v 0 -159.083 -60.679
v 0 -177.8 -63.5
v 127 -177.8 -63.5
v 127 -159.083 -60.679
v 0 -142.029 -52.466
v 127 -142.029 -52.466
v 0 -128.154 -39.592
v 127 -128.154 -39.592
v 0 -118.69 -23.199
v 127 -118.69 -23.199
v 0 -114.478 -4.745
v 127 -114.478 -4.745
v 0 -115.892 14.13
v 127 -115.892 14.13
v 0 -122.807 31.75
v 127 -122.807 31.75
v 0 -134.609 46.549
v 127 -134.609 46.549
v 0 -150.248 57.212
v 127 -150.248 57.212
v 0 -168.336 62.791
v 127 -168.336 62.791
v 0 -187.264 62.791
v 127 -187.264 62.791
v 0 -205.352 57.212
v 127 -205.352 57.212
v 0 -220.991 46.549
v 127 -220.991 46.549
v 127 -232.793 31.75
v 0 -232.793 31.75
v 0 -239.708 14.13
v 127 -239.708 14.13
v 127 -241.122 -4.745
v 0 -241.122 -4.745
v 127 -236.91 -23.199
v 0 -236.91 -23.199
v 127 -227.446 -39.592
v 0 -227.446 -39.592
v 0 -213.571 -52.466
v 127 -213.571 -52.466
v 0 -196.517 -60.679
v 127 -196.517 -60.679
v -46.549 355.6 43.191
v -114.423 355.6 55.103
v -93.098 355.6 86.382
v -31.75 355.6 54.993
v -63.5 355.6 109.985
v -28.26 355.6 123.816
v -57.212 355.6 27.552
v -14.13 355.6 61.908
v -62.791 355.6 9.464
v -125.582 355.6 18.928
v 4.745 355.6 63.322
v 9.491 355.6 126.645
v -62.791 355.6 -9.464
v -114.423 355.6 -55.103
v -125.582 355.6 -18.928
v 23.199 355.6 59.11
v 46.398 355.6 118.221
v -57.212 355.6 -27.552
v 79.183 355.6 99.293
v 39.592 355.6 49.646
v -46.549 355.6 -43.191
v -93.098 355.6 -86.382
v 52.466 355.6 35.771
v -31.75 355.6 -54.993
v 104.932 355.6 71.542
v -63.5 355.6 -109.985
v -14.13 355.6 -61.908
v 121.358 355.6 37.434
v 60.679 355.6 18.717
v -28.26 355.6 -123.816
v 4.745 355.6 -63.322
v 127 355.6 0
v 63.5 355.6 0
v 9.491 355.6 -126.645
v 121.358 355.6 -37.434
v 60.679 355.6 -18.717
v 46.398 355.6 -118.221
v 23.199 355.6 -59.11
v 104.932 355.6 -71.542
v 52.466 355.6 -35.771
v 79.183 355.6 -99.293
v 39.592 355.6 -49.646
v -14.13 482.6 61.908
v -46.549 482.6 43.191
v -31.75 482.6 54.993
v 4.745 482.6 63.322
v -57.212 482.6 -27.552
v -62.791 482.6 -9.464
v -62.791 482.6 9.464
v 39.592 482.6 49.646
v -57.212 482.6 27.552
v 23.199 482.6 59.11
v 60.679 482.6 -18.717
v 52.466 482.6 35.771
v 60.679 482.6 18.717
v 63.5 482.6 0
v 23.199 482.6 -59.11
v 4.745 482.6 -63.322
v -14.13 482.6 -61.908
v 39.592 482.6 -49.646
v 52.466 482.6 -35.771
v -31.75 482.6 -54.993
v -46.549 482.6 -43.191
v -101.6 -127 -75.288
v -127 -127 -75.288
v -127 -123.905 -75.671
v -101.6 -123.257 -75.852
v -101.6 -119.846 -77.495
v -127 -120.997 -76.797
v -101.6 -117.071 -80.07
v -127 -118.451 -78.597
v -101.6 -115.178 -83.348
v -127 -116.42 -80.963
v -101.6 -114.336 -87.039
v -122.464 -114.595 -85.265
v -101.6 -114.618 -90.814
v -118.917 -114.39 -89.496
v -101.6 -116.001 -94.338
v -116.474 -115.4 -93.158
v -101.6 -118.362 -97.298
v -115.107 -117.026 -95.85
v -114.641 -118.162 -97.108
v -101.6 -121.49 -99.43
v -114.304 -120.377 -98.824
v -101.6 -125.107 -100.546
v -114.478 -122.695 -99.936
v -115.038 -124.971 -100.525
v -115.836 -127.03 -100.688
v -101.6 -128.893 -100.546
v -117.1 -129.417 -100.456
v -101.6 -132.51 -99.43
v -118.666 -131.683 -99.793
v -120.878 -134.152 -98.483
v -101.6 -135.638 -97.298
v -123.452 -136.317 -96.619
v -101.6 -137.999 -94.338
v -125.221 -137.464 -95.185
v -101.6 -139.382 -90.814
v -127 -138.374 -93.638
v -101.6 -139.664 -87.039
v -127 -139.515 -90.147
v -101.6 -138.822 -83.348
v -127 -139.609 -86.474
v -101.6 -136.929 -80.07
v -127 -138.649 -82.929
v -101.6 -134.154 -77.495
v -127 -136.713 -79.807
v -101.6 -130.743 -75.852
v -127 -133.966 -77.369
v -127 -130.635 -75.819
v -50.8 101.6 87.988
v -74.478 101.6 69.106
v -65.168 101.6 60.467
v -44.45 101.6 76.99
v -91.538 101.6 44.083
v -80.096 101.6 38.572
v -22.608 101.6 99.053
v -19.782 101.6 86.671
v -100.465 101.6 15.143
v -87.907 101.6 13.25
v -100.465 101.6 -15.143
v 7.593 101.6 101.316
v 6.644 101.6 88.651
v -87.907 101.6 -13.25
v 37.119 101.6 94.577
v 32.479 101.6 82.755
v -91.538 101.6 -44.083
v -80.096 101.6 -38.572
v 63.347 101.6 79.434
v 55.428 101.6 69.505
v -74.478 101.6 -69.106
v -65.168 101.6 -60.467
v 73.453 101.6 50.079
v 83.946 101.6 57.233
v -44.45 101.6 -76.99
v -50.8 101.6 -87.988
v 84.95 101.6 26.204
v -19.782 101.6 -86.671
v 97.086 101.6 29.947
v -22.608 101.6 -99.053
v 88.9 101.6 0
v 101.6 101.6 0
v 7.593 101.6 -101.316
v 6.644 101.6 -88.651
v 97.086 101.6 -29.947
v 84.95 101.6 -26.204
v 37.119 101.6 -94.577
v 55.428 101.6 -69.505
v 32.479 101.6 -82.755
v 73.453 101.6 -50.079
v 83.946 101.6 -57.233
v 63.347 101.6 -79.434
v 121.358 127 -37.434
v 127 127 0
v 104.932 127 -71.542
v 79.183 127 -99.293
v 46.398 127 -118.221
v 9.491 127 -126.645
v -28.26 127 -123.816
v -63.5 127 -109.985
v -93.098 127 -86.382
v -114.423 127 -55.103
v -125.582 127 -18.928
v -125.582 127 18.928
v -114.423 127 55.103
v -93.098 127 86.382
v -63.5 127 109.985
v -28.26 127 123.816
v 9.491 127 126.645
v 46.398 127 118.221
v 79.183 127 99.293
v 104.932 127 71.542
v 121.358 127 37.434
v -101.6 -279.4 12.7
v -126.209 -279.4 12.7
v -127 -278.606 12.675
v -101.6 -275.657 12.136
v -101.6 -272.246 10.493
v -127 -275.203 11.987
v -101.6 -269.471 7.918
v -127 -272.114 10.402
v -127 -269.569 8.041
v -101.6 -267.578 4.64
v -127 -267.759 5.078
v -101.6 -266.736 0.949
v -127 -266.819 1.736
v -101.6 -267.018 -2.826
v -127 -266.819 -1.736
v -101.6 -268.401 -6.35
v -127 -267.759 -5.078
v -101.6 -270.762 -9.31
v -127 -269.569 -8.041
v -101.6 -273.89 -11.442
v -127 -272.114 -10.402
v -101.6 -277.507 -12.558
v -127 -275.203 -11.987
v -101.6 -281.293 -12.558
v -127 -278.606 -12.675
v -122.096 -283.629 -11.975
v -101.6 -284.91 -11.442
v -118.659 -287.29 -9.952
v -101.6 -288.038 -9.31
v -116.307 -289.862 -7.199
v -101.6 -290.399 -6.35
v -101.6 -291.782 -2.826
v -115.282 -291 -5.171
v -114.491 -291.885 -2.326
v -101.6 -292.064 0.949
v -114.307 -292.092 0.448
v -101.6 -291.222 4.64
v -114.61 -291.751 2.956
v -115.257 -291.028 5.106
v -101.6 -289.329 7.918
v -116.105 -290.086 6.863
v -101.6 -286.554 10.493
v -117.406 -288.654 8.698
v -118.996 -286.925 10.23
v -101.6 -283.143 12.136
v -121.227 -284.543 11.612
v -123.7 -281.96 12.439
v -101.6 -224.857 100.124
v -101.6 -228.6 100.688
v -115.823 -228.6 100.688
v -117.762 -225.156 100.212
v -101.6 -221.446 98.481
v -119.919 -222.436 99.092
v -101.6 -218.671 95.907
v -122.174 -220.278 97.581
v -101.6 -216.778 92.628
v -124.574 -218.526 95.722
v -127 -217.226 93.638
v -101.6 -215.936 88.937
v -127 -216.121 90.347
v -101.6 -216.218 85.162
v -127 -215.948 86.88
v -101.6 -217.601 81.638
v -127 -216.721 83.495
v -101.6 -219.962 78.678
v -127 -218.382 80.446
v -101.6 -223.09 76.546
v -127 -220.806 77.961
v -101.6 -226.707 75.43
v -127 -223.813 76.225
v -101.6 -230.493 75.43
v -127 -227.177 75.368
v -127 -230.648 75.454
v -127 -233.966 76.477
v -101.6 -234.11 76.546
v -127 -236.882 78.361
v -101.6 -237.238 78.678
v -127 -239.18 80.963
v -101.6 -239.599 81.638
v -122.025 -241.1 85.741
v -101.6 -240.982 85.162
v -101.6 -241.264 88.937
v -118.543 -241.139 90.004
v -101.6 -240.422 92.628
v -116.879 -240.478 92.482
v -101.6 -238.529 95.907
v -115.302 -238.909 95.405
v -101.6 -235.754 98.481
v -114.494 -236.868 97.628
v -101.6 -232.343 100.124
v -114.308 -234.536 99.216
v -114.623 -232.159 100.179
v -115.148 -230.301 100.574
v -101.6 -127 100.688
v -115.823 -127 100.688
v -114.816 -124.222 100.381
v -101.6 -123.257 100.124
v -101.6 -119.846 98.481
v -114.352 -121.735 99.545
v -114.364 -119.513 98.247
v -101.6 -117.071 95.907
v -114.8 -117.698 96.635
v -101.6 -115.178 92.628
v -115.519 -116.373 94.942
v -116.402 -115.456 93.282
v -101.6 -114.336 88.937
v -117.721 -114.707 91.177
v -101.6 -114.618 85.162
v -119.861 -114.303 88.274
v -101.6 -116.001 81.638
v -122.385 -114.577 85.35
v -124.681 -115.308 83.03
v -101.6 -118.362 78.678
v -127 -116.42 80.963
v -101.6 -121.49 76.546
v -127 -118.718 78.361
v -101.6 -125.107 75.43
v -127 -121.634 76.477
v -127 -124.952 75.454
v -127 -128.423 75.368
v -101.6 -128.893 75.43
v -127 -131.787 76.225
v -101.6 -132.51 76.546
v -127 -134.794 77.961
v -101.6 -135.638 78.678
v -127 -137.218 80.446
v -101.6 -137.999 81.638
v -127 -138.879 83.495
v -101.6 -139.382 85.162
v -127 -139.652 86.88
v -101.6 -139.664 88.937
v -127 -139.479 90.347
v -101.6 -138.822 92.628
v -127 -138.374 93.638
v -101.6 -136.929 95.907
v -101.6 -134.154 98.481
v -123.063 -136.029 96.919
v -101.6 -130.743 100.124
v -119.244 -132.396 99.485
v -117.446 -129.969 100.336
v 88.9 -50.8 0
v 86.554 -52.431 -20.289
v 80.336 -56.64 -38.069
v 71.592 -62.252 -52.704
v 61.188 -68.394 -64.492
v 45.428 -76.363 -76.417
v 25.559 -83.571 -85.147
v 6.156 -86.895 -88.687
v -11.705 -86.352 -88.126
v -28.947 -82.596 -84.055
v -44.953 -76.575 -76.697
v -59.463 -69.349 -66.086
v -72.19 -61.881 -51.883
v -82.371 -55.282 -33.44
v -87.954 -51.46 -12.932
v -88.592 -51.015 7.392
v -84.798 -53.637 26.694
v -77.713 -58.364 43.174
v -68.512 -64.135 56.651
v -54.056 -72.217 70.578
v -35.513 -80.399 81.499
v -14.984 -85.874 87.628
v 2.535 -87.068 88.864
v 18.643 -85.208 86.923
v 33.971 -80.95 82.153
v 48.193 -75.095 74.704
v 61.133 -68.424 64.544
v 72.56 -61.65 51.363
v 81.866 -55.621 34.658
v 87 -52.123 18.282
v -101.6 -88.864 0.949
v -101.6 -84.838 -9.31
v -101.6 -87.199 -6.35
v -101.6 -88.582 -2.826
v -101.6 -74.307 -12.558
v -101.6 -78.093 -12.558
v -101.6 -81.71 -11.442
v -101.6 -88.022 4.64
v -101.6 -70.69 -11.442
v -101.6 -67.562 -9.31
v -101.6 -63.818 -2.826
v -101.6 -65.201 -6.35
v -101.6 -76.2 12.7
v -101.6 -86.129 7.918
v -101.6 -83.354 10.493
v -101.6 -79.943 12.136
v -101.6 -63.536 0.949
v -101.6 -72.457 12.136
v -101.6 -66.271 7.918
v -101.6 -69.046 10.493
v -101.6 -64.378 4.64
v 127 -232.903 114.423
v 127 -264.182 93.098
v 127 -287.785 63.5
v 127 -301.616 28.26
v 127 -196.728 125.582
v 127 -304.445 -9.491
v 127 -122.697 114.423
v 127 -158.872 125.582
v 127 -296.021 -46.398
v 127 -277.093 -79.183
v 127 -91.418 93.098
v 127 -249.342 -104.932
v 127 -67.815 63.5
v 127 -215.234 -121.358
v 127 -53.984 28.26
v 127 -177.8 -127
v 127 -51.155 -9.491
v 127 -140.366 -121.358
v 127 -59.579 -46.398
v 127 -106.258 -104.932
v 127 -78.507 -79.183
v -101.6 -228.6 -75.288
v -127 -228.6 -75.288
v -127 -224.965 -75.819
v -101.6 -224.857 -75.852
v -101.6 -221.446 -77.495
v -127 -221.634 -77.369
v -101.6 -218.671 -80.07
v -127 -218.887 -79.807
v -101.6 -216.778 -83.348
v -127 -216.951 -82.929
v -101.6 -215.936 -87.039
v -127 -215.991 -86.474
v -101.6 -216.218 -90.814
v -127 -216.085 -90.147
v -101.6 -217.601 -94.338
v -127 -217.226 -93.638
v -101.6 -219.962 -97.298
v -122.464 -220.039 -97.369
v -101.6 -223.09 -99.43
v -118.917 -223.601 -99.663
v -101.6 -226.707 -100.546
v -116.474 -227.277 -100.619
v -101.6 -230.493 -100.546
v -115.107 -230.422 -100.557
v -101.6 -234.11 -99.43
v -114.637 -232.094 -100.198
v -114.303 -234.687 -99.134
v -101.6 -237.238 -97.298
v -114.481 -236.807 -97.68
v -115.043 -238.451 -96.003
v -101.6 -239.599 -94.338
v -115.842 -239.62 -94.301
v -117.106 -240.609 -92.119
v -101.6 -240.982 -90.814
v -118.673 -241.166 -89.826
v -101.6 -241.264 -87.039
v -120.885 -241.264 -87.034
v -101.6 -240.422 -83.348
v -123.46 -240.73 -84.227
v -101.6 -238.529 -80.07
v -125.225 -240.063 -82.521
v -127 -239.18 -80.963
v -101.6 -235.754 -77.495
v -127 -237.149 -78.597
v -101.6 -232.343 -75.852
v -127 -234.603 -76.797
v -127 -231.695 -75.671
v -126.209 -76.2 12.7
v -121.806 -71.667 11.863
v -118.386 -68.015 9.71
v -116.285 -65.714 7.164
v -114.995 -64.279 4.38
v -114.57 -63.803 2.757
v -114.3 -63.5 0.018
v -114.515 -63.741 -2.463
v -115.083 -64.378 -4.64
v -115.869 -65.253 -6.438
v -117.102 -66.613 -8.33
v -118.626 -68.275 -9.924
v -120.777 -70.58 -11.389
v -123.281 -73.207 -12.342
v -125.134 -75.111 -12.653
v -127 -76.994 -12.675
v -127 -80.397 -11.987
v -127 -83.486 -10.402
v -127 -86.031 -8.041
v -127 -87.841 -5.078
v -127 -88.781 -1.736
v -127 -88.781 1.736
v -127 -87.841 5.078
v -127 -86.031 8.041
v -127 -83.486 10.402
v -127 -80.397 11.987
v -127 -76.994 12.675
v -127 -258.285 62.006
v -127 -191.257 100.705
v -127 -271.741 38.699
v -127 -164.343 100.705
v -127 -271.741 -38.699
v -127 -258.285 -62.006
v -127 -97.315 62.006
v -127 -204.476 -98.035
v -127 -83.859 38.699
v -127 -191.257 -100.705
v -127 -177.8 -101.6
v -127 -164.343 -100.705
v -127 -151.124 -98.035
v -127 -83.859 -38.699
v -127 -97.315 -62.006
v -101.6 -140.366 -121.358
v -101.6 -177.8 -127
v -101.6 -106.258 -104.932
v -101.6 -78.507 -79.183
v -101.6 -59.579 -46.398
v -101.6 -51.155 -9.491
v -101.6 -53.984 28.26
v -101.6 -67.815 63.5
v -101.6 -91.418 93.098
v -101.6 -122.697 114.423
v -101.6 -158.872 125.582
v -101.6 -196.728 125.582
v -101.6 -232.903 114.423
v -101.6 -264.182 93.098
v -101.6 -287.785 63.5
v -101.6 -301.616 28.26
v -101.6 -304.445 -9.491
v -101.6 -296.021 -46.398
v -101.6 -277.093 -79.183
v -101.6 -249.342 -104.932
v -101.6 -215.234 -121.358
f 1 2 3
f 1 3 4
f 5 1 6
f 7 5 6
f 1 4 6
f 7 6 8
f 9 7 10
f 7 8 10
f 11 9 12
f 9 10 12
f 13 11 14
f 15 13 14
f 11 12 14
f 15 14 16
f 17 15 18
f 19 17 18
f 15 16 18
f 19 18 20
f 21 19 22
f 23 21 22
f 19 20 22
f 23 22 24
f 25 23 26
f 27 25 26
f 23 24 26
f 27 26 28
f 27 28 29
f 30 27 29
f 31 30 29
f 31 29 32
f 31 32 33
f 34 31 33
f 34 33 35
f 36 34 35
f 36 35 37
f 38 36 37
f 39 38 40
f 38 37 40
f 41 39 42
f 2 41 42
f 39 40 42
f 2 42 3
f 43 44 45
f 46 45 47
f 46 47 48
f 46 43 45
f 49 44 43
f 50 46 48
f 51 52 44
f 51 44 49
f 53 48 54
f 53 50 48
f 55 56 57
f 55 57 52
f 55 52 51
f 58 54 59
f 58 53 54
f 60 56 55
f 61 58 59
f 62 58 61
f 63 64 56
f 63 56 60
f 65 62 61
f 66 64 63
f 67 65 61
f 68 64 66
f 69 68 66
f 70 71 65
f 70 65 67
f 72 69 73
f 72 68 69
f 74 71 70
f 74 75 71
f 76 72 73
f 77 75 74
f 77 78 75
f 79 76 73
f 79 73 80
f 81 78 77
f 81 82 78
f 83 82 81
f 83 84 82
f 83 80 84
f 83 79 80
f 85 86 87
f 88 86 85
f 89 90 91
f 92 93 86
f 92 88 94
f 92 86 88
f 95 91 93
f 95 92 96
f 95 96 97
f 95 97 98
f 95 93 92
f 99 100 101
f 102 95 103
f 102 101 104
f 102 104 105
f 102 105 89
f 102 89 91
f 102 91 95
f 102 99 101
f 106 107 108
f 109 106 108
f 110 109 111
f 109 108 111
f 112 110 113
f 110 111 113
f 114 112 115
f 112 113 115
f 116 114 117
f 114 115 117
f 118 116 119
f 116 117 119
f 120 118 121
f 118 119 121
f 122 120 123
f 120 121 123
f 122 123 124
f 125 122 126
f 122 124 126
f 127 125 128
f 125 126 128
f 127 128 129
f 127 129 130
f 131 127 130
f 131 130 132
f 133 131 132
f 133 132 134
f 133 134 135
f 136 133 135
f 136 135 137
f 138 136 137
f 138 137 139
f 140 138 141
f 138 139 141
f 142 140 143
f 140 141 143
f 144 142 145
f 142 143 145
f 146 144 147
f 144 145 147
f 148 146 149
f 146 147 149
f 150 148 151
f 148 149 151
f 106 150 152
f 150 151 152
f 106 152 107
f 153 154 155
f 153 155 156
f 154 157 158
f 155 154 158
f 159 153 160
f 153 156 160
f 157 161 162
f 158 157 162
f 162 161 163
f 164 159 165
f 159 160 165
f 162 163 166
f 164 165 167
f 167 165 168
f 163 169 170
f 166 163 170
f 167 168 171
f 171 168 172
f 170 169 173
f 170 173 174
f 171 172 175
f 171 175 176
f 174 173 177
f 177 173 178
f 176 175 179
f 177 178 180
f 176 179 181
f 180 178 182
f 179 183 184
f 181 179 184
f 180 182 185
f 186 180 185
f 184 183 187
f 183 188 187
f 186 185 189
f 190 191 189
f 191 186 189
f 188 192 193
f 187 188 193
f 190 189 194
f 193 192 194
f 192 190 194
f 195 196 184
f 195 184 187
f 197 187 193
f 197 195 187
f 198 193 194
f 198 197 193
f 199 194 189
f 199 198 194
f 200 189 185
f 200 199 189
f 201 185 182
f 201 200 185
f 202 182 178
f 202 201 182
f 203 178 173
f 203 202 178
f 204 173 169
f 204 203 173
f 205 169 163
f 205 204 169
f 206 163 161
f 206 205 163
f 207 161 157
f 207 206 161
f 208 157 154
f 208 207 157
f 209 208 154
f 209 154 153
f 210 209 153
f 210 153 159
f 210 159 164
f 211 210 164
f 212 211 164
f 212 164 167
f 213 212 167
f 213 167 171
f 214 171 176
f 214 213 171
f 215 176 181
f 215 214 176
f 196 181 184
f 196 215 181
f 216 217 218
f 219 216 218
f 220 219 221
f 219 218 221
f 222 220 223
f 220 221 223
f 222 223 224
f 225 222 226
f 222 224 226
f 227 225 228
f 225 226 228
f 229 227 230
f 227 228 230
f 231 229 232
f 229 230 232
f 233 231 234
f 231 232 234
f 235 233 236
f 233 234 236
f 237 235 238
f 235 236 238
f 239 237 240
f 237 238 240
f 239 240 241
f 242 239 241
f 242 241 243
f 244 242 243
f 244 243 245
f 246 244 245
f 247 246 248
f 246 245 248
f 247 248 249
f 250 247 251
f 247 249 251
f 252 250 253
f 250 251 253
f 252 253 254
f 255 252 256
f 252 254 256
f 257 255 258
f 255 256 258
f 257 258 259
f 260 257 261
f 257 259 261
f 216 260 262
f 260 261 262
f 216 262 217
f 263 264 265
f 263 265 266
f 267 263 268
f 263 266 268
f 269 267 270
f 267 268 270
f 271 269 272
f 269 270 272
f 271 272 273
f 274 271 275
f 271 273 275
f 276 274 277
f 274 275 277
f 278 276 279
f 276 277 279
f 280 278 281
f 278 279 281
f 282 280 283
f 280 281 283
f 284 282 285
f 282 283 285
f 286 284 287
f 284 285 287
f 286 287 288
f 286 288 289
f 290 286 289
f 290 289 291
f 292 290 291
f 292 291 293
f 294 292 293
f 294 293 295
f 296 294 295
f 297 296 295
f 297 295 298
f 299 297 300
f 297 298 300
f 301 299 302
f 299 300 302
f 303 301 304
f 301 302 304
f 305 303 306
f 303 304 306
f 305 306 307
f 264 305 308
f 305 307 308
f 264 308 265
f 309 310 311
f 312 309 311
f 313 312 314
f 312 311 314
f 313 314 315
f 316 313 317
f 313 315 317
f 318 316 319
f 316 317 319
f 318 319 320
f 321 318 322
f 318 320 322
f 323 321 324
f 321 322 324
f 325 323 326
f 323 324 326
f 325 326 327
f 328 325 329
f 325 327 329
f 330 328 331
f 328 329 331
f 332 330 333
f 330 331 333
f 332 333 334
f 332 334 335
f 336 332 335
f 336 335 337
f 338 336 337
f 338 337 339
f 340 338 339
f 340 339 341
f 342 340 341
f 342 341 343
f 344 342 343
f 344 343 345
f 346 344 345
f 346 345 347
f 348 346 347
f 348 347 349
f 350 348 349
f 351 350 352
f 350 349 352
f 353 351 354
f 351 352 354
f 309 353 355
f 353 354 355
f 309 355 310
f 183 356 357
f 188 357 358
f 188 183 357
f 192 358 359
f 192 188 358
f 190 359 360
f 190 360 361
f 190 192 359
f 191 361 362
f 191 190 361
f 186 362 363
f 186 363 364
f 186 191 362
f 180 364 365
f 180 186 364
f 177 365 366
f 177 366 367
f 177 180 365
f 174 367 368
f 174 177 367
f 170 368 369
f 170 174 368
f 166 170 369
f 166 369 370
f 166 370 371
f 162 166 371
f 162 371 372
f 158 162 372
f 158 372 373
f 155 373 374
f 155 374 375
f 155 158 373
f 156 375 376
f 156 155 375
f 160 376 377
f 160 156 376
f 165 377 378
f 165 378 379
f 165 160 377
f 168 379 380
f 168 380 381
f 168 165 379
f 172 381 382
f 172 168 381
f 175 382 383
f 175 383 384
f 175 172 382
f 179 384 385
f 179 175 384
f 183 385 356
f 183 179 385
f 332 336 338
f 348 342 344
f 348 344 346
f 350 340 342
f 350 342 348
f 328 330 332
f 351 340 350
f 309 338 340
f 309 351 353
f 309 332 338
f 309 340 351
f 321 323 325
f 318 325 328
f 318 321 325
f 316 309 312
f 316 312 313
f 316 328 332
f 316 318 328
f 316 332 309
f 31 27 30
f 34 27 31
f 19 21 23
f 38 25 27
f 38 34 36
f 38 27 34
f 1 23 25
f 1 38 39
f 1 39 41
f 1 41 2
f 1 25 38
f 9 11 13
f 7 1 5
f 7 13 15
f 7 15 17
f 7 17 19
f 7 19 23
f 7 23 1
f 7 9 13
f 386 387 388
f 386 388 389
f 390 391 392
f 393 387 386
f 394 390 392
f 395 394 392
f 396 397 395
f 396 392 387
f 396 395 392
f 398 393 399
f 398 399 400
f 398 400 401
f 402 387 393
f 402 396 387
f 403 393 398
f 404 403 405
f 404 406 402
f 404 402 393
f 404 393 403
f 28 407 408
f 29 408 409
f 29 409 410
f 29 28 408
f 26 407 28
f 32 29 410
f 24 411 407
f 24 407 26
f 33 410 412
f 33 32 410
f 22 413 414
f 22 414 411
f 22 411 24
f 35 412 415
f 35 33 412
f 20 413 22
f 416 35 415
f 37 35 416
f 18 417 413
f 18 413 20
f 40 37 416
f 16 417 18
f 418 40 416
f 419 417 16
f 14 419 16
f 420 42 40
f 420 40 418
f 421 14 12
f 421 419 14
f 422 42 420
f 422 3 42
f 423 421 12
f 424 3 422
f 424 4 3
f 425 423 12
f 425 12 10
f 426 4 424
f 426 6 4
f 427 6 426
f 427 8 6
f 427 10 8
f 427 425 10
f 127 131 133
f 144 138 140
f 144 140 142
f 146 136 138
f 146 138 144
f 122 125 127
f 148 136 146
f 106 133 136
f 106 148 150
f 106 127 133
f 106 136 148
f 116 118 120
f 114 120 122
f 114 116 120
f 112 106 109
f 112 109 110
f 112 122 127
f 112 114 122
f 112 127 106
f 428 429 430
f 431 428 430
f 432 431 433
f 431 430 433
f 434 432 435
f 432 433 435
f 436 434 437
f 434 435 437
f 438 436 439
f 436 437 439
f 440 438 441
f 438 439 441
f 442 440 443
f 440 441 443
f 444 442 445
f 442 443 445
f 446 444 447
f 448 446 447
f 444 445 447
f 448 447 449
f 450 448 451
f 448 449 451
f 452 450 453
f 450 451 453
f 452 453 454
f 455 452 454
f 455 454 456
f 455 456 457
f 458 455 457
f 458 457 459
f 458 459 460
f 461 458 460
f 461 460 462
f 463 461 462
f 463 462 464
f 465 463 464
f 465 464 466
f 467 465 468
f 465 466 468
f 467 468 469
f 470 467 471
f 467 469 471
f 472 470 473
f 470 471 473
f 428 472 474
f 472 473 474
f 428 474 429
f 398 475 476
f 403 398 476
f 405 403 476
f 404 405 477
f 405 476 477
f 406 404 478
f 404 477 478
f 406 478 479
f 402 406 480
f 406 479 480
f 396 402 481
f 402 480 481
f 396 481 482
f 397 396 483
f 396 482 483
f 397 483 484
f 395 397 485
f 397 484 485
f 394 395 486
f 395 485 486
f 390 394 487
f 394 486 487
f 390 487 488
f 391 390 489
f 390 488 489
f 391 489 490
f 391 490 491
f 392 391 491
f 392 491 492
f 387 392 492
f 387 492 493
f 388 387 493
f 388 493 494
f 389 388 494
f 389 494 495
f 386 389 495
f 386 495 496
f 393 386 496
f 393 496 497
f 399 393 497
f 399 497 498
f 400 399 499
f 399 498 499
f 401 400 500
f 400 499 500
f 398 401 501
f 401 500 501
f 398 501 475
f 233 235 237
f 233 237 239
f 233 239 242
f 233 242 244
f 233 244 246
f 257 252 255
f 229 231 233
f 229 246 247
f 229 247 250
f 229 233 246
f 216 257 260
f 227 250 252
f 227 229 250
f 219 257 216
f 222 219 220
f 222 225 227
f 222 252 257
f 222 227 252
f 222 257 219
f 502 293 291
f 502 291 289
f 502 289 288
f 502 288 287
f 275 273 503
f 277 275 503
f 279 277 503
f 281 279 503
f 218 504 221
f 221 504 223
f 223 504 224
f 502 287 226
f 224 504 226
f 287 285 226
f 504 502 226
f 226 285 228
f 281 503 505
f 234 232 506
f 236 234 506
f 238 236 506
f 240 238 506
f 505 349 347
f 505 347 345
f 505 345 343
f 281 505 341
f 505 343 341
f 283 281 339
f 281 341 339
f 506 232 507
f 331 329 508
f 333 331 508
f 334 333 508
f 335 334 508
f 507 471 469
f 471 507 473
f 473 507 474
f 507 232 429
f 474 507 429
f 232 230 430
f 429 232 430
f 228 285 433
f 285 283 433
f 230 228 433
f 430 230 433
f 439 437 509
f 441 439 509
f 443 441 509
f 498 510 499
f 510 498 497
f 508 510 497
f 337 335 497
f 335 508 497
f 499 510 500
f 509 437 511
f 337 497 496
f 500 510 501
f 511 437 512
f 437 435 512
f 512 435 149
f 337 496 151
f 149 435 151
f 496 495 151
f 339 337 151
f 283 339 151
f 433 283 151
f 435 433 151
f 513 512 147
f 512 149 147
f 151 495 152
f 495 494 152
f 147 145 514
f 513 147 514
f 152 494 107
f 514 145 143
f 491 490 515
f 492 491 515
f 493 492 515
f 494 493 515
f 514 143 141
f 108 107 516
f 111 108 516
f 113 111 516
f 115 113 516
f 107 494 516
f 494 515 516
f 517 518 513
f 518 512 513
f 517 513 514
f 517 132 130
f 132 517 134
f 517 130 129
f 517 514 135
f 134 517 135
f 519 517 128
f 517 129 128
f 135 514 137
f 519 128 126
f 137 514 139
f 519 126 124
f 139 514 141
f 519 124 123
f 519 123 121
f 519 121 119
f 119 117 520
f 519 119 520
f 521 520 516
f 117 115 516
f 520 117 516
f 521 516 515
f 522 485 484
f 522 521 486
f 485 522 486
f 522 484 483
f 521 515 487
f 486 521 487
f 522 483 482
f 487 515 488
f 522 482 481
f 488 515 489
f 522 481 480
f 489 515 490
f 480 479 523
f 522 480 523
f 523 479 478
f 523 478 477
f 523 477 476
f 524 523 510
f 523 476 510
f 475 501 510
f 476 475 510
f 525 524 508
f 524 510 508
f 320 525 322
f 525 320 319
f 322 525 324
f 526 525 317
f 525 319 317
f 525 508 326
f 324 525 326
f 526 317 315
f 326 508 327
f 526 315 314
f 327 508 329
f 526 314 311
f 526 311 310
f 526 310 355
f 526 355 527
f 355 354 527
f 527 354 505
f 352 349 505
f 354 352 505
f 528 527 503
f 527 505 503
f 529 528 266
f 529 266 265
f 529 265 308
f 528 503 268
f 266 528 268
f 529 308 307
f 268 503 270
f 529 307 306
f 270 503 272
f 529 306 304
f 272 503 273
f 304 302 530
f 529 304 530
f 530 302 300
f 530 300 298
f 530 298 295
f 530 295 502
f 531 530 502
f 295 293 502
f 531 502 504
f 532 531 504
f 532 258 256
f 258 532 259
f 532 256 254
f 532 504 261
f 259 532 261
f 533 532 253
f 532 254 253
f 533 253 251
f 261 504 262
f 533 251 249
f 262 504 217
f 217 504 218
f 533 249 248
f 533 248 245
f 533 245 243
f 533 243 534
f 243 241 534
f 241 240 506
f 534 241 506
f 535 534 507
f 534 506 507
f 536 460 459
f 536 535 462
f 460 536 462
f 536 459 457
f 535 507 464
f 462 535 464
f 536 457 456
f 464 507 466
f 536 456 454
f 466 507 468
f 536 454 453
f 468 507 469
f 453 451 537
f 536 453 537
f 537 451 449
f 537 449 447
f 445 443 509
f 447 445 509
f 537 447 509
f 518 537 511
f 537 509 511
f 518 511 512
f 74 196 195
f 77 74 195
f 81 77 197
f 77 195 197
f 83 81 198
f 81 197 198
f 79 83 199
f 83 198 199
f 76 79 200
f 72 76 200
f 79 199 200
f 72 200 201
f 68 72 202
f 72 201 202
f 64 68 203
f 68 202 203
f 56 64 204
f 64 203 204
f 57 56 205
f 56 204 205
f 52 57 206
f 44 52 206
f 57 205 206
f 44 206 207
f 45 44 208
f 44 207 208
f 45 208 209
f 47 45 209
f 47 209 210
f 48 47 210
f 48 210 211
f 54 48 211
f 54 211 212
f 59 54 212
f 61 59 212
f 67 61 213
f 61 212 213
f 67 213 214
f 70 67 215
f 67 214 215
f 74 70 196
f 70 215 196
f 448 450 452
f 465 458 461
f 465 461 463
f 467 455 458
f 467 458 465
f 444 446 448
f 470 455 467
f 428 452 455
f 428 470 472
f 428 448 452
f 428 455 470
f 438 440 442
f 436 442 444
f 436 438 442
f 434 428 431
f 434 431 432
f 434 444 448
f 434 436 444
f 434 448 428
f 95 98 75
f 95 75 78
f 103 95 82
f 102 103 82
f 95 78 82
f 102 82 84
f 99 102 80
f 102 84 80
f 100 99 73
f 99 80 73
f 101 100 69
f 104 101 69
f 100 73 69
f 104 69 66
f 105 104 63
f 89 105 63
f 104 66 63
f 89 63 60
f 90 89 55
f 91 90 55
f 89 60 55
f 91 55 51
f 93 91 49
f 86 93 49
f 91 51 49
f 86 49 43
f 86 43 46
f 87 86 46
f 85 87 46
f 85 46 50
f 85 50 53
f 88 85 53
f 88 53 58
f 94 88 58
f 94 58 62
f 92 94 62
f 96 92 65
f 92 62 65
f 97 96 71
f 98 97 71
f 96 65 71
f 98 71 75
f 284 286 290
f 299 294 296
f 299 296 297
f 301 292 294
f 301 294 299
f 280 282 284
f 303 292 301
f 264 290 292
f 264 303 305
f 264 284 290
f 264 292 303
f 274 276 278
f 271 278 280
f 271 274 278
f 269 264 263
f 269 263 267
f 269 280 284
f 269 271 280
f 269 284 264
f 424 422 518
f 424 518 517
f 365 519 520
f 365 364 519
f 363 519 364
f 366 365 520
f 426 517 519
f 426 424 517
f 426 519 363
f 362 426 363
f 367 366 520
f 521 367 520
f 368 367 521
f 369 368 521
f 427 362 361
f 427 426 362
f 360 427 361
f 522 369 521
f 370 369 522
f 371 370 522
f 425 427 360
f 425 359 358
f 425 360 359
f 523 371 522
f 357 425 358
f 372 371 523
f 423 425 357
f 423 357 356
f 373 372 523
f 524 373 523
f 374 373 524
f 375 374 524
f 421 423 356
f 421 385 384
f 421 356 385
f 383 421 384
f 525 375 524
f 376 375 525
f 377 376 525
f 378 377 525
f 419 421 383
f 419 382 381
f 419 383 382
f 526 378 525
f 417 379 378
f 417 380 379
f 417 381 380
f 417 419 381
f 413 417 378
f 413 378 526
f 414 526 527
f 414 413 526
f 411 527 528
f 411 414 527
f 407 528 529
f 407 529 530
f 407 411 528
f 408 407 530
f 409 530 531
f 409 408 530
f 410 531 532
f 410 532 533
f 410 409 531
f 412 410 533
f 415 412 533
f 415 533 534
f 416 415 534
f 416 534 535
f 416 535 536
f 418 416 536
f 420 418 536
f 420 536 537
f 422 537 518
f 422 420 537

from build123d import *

# Parameters (mm, degrees)
SKETCH1_R           = 88.9
BOSS_EXTRUDE1_DEPTH = 101.6
SKETCH4_R           = 127
BOSS_EXTRUDE2_DEPTH = 127
SKETCH6_R           = 127
BOSS_EXTRUDE4_DEPTH = 254
SKETCH5_R           = 63.5
CUT_EXTRUDE1_DEPTH  = 127
SKETCH7_R           = 63.5
BOSS_EXTRUDE5_DEPTH = 127
CHAMFER1_SIZE       = 25.4
SKETCH8_R           = 12.7
CUT_EXTRUDE2_DEPTH  = 25.4
CHAMFER2_SIZE       = 25.4


with BuildPart() as part:
    # Sketch1 → Boss-Extrude1 (new body, symmetric)
    with BuildSketch(Plane(origin=(0, 0, 0), x_dir=(1, 0, 0), z_dir=(0, 1, 0))):
        Circle(SKETCH1_R)
    extrude(amount=BOSS_EXTRUDE1_DEPTH, both=True)

    # Sketch4 → Boss-Extrude2 (add, symmetric)
    with BuildSketch(Plane(origin=(0, 0, 0), x_dir=(0, 0, -1), z_dir=(1, 0, 0))):
        with Locations((0, -177.8)):
            Circle(SKETCH4_R)
    extrude(amount=BOSS_EXTRUDE2_DEPTH, both=True)

    # Sketch6 → Boss-Extrude4 (add)
    with BuildSketch(Plane(origin=(0, 101.6, 0), x_dir=(1, 0, 0), z_dir=(0, 1, 0))):
        Circle(SKETCH6_R)
    extrude(amount=BOSS_EXTRUDE4_DEPTH)

    # Sketch5 → Cut-Extrude1 (cut)
    with BuildSketch(Plane(origin=(127, 0, 0), x_dir=(0, 0, -1), z_dir=(1, 0, 0))):
        with Locations((0, -177.8)):
            Circle(SKETCH5_R)
    extrude(amount=-CUT_EXTRUDE1_DEPTH, mode=Mode.SUBTRACT)

    # Sketch7 → Boss-Extrude5 (add)
    with BuildSketch(Plane(origin=(0, 355.6, 0), x_dir=(1, 0, 0), z_dir=(0, 1, 0))):
        Circle(SKETCH7_R)
    extrude(amount=BOSS_EXTRUDE5_DEPTH)

    # Chamfer1
    chamfer1_edges = [part.edges().sort_by_distance(p)[0] for p in [
        (-127, -177.8, 127),
    ]]
    chamfer(chamfer1_edges, length=CHAMFER1_SIZE)

    # Sketch8 → Cut-Extrude2 (cut)
    with BuildSketch(Plane.ZY.offset(127)):
        with Locations((0, -76.2)):
            Circle(SKETCH8_R)
        with Locations((87.988181025, -127)):
            Circle(SKETCH8_R)
        with Locations((87.988181025, -228.6)):
            Circle(SKETCH8_R)
        with Locations((0, -279.4)):
            Circle(SKETCH8_R)
        with Locations((-87.988181024, -228.6)):
            Circle(SKETCH8_R)
        with Locations((-87.988181024, -127)):
            Circle(SKETCH8_R)
    extrude(amount=-CUT_EXTRUDE2_DEPTH, mode=Mode.SUBTRACT)

    # Chamfer2
    chamfer2_edges = [part.edges().sort_by_distance(p)[0] for p in [
        (-127, 101.6, 0),
    ]]
    chamfer(chamfer2_edges, length=CHAMFER2_SIZE)


solid = part.part
